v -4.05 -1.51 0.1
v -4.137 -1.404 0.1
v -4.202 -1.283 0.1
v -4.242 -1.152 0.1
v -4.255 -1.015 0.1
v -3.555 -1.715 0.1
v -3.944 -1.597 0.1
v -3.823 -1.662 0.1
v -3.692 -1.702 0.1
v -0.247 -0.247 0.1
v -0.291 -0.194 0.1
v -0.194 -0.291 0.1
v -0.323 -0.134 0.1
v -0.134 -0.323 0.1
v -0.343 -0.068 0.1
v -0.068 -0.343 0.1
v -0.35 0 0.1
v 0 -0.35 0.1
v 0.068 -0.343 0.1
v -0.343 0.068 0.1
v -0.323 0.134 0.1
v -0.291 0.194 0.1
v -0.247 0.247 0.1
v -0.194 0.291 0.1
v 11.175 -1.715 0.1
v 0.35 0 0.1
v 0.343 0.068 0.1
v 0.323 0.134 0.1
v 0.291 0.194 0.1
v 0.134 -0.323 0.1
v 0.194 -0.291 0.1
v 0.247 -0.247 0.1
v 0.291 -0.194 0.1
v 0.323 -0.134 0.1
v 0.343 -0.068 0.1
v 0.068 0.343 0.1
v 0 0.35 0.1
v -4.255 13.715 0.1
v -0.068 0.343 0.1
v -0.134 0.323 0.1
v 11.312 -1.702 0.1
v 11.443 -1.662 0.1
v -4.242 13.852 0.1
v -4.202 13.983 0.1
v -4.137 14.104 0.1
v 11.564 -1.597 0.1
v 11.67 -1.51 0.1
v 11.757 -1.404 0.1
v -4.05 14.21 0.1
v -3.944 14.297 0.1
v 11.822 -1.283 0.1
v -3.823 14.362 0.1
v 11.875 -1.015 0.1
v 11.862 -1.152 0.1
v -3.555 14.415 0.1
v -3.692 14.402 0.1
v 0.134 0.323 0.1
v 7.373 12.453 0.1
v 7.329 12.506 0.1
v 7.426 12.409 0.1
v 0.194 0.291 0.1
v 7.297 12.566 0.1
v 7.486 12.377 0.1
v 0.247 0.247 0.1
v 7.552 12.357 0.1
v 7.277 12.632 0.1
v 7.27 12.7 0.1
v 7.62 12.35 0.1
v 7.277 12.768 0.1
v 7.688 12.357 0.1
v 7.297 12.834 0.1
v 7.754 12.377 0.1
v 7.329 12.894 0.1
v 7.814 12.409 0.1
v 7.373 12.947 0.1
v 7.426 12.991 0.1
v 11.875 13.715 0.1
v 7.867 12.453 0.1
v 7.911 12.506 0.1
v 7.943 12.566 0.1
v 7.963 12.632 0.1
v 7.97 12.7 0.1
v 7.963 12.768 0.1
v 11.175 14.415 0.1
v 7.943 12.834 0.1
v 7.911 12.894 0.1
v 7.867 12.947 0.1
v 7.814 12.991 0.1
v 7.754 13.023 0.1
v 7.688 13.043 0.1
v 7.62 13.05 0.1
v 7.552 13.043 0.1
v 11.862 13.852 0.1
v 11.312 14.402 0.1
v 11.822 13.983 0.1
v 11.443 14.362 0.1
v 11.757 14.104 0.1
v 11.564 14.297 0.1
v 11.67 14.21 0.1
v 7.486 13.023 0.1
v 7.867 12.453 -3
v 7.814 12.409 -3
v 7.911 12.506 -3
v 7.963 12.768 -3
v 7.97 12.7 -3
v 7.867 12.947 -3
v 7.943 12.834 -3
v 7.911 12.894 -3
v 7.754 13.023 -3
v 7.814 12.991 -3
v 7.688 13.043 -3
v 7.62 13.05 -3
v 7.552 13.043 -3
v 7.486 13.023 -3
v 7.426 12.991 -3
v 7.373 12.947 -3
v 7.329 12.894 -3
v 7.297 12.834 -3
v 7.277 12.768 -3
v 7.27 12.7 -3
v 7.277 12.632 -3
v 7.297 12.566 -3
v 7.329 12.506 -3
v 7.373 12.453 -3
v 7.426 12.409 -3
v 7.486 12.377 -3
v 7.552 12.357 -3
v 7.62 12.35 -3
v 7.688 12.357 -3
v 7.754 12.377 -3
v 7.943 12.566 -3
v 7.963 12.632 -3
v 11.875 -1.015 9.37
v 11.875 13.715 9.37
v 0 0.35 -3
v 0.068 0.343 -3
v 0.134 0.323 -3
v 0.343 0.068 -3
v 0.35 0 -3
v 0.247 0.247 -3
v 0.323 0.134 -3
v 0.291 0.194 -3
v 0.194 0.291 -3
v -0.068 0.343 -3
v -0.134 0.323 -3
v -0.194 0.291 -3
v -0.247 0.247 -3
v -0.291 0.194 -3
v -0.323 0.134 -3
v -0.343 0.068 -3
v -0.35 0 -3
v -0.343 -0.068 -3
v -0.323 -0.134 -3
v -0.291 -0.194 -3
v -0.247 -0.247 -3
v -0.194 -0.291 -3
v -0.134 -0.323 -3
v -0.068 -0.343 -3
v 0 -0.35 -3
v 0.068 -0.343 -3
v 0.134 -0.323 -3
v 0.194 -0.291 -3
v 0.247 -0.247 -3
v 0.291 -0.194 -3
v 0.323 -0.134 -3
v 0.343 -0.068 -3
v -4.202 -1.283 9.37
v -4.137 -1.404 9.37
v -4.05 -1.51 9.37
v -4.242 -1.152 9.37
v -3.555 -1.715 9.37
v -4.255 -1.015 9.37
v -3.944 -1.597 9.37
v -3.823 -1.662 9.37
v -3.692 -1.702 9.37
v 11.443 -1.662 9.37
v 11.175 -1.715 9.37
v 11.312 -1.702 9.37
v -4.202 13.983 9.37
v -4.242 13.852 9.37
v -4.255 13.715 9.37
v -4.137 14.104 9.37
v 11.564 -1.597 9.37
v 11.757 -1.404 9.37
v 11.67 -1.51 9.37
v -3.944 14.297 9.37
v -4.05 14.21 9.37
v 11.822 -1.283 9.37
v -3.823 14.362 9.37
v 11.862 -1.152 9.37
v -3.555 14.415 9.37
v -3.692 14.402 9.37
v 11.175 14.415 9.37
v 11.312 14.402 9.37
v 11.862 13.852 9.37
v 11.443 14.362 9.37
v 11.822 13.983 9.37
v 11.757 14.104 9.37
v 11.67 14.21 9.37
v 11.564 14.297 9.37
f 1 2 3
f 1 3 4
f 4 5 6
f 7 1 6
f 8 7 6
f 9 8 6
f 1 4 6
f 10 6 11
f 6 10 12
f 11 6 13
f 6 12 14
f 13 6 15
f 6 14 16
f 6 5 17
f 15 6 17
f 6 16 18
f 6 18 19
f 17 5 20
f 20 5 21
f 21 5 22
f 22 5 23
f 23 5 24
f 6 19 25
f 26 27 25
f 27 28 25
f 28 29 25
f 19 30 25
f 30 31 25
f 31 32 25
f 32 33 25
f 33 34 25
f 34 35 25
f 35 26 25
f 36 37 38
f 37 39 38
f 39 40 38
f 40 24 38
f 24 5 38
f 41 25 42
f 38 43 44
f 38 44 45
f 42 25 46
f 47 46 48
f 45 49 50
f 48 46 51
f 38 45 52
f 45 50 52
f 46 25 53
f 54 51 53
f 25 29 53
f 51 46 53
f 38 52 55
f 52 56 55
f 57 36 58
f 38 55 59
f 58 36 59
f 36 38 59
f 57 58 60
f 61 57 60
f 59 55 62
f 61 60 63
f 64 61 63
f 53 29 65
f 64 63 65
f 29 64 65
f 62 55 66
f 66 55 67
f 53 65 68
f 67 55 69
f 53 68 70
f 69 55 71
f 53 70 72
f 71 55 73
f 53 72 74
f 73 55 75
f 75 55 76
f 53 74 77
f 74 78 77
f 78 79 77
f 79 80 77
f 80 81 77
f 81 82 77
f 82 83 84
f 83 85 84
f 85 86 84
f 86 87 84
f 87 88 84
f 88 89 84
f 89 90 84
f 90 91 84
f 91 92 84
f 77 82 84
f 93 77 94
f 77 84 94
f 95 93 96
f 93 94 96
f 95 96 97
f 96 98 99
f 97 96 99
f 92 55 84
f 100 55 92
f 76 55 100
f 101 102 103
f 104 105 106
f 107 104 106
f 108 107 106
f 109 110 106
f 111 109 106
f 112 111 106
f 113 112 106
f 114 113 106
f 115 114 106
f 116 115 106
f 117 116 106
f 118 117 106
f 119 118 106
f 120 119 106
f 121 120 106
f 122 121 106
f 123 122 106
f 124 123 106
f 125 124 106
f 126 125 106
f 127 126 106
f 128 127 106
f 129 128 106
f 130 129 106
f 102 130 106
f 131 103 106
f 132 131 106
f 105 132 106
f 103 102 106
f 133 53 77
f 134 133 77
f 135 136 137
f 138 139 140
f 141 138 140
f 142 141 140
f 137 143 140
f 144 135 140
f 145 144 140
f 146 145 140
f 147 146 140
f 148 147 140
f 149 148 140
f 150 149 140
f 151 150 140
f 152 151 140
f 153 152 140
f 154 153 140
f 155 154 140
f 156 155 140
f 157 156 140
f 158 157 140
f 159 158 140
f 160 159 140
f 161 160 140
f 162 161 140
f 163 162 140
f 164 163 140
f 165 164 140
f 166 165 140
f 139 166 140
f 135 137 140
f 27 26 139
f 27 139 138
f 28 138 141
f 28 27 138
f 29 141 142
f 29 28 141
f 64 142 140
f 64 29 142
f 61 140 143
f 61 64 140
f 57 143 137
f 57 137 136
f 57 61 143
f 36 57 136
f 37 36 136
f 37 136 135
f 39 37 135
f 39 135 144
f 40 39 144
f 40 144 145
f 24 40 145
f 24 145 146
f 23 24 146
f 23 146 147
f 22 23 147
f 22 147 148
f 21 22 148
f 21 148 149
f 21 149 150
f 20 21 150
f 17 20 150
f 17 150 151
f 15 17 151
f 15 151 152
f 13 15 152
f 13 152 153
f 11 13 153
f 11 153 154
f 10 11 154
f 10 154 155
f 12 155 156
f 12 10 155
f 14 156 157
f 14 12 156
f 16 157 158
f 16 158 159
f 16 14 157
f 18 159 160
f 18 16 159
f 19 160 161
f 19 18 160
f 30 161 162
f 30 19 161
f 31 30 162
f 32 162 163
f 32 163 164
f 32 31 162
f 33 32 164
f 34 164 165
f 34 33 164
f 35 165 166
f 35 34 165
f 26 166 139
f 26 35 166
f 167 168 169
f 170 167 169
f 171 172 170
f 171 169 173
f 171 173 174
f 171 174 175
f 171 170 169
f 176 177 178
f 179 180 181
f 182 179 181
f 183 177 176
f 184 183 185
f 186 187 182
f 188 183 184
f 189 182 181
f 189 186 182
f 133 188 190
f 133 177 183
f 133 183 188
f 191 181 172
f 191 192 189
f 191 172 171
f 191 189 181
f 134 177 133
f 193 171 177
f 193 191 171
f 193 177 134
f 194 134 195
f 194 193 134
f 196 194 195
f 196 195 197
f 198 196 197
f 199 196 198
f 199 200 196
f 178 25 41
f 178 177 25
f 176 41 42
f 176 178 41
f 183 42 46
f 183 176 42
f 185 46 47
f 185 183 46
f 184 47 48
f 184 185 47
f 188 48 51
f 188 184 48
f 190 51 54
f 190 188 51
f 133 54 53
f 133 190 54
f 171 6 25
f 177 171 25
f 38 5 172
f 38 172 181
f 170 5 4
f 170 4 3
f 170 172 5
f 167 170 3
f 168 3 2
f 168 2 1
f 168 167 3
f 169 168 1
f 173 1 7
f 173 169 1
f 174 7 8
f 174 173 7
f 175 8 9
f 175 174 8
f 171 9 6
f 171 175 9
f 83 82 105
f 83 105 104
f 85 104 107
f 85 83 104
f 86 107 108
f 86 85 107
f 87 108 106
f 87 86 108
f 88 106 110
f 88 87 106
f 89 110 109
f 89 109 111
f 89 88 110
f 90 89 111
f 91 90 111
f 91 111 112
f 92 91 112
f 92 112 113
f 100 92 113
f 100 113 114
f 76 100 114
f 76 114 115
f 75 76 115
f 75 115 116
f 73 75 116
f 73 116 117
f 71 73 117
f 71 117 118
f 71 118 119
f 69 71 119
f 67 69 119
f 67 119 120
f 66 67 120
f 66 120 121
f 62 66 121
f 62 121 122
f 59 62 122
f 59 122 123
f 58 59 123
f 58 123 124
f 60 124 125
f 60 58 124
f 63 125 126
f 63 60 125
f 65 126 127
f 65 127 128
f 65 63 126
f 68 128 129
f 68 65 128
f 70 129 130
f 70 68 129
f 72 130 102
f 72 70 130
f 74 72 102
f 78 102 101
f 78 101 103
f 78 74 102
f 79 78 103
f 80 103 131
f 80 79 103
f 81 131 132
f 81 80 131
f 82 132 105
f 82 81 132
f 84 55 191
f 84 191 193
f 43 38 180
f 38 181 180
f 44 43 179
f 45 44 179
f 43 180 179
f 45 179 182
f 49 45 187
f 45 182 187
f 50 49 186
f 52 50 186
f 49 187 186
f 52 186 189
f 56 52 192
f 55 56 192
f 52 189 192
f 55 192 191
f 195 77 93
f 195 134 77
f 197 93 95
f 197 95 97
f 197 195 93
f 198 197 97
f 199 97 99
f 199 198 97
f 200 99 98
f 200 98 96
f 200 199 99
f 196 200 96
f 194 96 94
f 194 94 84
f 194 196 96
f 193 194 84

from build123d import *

# Parameters (mm, degrees)
SKETCH001_R  = 0.35
PAD001_DEPTH = 3.5
SKETCH_W     = 16.13
SKETCH_H     = 16.13
PAD_DEPTH    = 9.27
FILLET_R     = 0.7


with BuildPart() as pad001:
    # Sketch001 → Pad001 (new body)
    with BuildSketch(Plane.XY.offset(0.5)):
        Circle(SKETCH001_R)
        with Locations((7.62, 12.7)):
            Circle(SKETCH001_R)
    extrude(amount=-PAD001_DEPTH)


with BuildPart() as fillet_mp_cp:
    # Sketch → Pad (new body)
    with BuildSketch(Plane.XY.offset(0.1)):
        with Locations((3.81, 6.35)):
            Rectangle(SKETCH_W, SKETCH_H)
    extrude(amount=PAD_DEPTH)

    # Fillet
    fillet_edges = [fillet_mp_cp.edges().sort_by_distance(p)[0] for p in [
        (11.875, -1.715, 4.735),
        (11.875, 14.415, 4.735),
        (-4.255, -1.715, 4.735),
        (-4.255, 14.415, 4.735),
    ]]
    fillet(fillet_edges, radius=FILLET_R)

    # Fillet_mp_cp: union Pad001
    add(pad001.part)


solid = fillet_mp_cp.part
